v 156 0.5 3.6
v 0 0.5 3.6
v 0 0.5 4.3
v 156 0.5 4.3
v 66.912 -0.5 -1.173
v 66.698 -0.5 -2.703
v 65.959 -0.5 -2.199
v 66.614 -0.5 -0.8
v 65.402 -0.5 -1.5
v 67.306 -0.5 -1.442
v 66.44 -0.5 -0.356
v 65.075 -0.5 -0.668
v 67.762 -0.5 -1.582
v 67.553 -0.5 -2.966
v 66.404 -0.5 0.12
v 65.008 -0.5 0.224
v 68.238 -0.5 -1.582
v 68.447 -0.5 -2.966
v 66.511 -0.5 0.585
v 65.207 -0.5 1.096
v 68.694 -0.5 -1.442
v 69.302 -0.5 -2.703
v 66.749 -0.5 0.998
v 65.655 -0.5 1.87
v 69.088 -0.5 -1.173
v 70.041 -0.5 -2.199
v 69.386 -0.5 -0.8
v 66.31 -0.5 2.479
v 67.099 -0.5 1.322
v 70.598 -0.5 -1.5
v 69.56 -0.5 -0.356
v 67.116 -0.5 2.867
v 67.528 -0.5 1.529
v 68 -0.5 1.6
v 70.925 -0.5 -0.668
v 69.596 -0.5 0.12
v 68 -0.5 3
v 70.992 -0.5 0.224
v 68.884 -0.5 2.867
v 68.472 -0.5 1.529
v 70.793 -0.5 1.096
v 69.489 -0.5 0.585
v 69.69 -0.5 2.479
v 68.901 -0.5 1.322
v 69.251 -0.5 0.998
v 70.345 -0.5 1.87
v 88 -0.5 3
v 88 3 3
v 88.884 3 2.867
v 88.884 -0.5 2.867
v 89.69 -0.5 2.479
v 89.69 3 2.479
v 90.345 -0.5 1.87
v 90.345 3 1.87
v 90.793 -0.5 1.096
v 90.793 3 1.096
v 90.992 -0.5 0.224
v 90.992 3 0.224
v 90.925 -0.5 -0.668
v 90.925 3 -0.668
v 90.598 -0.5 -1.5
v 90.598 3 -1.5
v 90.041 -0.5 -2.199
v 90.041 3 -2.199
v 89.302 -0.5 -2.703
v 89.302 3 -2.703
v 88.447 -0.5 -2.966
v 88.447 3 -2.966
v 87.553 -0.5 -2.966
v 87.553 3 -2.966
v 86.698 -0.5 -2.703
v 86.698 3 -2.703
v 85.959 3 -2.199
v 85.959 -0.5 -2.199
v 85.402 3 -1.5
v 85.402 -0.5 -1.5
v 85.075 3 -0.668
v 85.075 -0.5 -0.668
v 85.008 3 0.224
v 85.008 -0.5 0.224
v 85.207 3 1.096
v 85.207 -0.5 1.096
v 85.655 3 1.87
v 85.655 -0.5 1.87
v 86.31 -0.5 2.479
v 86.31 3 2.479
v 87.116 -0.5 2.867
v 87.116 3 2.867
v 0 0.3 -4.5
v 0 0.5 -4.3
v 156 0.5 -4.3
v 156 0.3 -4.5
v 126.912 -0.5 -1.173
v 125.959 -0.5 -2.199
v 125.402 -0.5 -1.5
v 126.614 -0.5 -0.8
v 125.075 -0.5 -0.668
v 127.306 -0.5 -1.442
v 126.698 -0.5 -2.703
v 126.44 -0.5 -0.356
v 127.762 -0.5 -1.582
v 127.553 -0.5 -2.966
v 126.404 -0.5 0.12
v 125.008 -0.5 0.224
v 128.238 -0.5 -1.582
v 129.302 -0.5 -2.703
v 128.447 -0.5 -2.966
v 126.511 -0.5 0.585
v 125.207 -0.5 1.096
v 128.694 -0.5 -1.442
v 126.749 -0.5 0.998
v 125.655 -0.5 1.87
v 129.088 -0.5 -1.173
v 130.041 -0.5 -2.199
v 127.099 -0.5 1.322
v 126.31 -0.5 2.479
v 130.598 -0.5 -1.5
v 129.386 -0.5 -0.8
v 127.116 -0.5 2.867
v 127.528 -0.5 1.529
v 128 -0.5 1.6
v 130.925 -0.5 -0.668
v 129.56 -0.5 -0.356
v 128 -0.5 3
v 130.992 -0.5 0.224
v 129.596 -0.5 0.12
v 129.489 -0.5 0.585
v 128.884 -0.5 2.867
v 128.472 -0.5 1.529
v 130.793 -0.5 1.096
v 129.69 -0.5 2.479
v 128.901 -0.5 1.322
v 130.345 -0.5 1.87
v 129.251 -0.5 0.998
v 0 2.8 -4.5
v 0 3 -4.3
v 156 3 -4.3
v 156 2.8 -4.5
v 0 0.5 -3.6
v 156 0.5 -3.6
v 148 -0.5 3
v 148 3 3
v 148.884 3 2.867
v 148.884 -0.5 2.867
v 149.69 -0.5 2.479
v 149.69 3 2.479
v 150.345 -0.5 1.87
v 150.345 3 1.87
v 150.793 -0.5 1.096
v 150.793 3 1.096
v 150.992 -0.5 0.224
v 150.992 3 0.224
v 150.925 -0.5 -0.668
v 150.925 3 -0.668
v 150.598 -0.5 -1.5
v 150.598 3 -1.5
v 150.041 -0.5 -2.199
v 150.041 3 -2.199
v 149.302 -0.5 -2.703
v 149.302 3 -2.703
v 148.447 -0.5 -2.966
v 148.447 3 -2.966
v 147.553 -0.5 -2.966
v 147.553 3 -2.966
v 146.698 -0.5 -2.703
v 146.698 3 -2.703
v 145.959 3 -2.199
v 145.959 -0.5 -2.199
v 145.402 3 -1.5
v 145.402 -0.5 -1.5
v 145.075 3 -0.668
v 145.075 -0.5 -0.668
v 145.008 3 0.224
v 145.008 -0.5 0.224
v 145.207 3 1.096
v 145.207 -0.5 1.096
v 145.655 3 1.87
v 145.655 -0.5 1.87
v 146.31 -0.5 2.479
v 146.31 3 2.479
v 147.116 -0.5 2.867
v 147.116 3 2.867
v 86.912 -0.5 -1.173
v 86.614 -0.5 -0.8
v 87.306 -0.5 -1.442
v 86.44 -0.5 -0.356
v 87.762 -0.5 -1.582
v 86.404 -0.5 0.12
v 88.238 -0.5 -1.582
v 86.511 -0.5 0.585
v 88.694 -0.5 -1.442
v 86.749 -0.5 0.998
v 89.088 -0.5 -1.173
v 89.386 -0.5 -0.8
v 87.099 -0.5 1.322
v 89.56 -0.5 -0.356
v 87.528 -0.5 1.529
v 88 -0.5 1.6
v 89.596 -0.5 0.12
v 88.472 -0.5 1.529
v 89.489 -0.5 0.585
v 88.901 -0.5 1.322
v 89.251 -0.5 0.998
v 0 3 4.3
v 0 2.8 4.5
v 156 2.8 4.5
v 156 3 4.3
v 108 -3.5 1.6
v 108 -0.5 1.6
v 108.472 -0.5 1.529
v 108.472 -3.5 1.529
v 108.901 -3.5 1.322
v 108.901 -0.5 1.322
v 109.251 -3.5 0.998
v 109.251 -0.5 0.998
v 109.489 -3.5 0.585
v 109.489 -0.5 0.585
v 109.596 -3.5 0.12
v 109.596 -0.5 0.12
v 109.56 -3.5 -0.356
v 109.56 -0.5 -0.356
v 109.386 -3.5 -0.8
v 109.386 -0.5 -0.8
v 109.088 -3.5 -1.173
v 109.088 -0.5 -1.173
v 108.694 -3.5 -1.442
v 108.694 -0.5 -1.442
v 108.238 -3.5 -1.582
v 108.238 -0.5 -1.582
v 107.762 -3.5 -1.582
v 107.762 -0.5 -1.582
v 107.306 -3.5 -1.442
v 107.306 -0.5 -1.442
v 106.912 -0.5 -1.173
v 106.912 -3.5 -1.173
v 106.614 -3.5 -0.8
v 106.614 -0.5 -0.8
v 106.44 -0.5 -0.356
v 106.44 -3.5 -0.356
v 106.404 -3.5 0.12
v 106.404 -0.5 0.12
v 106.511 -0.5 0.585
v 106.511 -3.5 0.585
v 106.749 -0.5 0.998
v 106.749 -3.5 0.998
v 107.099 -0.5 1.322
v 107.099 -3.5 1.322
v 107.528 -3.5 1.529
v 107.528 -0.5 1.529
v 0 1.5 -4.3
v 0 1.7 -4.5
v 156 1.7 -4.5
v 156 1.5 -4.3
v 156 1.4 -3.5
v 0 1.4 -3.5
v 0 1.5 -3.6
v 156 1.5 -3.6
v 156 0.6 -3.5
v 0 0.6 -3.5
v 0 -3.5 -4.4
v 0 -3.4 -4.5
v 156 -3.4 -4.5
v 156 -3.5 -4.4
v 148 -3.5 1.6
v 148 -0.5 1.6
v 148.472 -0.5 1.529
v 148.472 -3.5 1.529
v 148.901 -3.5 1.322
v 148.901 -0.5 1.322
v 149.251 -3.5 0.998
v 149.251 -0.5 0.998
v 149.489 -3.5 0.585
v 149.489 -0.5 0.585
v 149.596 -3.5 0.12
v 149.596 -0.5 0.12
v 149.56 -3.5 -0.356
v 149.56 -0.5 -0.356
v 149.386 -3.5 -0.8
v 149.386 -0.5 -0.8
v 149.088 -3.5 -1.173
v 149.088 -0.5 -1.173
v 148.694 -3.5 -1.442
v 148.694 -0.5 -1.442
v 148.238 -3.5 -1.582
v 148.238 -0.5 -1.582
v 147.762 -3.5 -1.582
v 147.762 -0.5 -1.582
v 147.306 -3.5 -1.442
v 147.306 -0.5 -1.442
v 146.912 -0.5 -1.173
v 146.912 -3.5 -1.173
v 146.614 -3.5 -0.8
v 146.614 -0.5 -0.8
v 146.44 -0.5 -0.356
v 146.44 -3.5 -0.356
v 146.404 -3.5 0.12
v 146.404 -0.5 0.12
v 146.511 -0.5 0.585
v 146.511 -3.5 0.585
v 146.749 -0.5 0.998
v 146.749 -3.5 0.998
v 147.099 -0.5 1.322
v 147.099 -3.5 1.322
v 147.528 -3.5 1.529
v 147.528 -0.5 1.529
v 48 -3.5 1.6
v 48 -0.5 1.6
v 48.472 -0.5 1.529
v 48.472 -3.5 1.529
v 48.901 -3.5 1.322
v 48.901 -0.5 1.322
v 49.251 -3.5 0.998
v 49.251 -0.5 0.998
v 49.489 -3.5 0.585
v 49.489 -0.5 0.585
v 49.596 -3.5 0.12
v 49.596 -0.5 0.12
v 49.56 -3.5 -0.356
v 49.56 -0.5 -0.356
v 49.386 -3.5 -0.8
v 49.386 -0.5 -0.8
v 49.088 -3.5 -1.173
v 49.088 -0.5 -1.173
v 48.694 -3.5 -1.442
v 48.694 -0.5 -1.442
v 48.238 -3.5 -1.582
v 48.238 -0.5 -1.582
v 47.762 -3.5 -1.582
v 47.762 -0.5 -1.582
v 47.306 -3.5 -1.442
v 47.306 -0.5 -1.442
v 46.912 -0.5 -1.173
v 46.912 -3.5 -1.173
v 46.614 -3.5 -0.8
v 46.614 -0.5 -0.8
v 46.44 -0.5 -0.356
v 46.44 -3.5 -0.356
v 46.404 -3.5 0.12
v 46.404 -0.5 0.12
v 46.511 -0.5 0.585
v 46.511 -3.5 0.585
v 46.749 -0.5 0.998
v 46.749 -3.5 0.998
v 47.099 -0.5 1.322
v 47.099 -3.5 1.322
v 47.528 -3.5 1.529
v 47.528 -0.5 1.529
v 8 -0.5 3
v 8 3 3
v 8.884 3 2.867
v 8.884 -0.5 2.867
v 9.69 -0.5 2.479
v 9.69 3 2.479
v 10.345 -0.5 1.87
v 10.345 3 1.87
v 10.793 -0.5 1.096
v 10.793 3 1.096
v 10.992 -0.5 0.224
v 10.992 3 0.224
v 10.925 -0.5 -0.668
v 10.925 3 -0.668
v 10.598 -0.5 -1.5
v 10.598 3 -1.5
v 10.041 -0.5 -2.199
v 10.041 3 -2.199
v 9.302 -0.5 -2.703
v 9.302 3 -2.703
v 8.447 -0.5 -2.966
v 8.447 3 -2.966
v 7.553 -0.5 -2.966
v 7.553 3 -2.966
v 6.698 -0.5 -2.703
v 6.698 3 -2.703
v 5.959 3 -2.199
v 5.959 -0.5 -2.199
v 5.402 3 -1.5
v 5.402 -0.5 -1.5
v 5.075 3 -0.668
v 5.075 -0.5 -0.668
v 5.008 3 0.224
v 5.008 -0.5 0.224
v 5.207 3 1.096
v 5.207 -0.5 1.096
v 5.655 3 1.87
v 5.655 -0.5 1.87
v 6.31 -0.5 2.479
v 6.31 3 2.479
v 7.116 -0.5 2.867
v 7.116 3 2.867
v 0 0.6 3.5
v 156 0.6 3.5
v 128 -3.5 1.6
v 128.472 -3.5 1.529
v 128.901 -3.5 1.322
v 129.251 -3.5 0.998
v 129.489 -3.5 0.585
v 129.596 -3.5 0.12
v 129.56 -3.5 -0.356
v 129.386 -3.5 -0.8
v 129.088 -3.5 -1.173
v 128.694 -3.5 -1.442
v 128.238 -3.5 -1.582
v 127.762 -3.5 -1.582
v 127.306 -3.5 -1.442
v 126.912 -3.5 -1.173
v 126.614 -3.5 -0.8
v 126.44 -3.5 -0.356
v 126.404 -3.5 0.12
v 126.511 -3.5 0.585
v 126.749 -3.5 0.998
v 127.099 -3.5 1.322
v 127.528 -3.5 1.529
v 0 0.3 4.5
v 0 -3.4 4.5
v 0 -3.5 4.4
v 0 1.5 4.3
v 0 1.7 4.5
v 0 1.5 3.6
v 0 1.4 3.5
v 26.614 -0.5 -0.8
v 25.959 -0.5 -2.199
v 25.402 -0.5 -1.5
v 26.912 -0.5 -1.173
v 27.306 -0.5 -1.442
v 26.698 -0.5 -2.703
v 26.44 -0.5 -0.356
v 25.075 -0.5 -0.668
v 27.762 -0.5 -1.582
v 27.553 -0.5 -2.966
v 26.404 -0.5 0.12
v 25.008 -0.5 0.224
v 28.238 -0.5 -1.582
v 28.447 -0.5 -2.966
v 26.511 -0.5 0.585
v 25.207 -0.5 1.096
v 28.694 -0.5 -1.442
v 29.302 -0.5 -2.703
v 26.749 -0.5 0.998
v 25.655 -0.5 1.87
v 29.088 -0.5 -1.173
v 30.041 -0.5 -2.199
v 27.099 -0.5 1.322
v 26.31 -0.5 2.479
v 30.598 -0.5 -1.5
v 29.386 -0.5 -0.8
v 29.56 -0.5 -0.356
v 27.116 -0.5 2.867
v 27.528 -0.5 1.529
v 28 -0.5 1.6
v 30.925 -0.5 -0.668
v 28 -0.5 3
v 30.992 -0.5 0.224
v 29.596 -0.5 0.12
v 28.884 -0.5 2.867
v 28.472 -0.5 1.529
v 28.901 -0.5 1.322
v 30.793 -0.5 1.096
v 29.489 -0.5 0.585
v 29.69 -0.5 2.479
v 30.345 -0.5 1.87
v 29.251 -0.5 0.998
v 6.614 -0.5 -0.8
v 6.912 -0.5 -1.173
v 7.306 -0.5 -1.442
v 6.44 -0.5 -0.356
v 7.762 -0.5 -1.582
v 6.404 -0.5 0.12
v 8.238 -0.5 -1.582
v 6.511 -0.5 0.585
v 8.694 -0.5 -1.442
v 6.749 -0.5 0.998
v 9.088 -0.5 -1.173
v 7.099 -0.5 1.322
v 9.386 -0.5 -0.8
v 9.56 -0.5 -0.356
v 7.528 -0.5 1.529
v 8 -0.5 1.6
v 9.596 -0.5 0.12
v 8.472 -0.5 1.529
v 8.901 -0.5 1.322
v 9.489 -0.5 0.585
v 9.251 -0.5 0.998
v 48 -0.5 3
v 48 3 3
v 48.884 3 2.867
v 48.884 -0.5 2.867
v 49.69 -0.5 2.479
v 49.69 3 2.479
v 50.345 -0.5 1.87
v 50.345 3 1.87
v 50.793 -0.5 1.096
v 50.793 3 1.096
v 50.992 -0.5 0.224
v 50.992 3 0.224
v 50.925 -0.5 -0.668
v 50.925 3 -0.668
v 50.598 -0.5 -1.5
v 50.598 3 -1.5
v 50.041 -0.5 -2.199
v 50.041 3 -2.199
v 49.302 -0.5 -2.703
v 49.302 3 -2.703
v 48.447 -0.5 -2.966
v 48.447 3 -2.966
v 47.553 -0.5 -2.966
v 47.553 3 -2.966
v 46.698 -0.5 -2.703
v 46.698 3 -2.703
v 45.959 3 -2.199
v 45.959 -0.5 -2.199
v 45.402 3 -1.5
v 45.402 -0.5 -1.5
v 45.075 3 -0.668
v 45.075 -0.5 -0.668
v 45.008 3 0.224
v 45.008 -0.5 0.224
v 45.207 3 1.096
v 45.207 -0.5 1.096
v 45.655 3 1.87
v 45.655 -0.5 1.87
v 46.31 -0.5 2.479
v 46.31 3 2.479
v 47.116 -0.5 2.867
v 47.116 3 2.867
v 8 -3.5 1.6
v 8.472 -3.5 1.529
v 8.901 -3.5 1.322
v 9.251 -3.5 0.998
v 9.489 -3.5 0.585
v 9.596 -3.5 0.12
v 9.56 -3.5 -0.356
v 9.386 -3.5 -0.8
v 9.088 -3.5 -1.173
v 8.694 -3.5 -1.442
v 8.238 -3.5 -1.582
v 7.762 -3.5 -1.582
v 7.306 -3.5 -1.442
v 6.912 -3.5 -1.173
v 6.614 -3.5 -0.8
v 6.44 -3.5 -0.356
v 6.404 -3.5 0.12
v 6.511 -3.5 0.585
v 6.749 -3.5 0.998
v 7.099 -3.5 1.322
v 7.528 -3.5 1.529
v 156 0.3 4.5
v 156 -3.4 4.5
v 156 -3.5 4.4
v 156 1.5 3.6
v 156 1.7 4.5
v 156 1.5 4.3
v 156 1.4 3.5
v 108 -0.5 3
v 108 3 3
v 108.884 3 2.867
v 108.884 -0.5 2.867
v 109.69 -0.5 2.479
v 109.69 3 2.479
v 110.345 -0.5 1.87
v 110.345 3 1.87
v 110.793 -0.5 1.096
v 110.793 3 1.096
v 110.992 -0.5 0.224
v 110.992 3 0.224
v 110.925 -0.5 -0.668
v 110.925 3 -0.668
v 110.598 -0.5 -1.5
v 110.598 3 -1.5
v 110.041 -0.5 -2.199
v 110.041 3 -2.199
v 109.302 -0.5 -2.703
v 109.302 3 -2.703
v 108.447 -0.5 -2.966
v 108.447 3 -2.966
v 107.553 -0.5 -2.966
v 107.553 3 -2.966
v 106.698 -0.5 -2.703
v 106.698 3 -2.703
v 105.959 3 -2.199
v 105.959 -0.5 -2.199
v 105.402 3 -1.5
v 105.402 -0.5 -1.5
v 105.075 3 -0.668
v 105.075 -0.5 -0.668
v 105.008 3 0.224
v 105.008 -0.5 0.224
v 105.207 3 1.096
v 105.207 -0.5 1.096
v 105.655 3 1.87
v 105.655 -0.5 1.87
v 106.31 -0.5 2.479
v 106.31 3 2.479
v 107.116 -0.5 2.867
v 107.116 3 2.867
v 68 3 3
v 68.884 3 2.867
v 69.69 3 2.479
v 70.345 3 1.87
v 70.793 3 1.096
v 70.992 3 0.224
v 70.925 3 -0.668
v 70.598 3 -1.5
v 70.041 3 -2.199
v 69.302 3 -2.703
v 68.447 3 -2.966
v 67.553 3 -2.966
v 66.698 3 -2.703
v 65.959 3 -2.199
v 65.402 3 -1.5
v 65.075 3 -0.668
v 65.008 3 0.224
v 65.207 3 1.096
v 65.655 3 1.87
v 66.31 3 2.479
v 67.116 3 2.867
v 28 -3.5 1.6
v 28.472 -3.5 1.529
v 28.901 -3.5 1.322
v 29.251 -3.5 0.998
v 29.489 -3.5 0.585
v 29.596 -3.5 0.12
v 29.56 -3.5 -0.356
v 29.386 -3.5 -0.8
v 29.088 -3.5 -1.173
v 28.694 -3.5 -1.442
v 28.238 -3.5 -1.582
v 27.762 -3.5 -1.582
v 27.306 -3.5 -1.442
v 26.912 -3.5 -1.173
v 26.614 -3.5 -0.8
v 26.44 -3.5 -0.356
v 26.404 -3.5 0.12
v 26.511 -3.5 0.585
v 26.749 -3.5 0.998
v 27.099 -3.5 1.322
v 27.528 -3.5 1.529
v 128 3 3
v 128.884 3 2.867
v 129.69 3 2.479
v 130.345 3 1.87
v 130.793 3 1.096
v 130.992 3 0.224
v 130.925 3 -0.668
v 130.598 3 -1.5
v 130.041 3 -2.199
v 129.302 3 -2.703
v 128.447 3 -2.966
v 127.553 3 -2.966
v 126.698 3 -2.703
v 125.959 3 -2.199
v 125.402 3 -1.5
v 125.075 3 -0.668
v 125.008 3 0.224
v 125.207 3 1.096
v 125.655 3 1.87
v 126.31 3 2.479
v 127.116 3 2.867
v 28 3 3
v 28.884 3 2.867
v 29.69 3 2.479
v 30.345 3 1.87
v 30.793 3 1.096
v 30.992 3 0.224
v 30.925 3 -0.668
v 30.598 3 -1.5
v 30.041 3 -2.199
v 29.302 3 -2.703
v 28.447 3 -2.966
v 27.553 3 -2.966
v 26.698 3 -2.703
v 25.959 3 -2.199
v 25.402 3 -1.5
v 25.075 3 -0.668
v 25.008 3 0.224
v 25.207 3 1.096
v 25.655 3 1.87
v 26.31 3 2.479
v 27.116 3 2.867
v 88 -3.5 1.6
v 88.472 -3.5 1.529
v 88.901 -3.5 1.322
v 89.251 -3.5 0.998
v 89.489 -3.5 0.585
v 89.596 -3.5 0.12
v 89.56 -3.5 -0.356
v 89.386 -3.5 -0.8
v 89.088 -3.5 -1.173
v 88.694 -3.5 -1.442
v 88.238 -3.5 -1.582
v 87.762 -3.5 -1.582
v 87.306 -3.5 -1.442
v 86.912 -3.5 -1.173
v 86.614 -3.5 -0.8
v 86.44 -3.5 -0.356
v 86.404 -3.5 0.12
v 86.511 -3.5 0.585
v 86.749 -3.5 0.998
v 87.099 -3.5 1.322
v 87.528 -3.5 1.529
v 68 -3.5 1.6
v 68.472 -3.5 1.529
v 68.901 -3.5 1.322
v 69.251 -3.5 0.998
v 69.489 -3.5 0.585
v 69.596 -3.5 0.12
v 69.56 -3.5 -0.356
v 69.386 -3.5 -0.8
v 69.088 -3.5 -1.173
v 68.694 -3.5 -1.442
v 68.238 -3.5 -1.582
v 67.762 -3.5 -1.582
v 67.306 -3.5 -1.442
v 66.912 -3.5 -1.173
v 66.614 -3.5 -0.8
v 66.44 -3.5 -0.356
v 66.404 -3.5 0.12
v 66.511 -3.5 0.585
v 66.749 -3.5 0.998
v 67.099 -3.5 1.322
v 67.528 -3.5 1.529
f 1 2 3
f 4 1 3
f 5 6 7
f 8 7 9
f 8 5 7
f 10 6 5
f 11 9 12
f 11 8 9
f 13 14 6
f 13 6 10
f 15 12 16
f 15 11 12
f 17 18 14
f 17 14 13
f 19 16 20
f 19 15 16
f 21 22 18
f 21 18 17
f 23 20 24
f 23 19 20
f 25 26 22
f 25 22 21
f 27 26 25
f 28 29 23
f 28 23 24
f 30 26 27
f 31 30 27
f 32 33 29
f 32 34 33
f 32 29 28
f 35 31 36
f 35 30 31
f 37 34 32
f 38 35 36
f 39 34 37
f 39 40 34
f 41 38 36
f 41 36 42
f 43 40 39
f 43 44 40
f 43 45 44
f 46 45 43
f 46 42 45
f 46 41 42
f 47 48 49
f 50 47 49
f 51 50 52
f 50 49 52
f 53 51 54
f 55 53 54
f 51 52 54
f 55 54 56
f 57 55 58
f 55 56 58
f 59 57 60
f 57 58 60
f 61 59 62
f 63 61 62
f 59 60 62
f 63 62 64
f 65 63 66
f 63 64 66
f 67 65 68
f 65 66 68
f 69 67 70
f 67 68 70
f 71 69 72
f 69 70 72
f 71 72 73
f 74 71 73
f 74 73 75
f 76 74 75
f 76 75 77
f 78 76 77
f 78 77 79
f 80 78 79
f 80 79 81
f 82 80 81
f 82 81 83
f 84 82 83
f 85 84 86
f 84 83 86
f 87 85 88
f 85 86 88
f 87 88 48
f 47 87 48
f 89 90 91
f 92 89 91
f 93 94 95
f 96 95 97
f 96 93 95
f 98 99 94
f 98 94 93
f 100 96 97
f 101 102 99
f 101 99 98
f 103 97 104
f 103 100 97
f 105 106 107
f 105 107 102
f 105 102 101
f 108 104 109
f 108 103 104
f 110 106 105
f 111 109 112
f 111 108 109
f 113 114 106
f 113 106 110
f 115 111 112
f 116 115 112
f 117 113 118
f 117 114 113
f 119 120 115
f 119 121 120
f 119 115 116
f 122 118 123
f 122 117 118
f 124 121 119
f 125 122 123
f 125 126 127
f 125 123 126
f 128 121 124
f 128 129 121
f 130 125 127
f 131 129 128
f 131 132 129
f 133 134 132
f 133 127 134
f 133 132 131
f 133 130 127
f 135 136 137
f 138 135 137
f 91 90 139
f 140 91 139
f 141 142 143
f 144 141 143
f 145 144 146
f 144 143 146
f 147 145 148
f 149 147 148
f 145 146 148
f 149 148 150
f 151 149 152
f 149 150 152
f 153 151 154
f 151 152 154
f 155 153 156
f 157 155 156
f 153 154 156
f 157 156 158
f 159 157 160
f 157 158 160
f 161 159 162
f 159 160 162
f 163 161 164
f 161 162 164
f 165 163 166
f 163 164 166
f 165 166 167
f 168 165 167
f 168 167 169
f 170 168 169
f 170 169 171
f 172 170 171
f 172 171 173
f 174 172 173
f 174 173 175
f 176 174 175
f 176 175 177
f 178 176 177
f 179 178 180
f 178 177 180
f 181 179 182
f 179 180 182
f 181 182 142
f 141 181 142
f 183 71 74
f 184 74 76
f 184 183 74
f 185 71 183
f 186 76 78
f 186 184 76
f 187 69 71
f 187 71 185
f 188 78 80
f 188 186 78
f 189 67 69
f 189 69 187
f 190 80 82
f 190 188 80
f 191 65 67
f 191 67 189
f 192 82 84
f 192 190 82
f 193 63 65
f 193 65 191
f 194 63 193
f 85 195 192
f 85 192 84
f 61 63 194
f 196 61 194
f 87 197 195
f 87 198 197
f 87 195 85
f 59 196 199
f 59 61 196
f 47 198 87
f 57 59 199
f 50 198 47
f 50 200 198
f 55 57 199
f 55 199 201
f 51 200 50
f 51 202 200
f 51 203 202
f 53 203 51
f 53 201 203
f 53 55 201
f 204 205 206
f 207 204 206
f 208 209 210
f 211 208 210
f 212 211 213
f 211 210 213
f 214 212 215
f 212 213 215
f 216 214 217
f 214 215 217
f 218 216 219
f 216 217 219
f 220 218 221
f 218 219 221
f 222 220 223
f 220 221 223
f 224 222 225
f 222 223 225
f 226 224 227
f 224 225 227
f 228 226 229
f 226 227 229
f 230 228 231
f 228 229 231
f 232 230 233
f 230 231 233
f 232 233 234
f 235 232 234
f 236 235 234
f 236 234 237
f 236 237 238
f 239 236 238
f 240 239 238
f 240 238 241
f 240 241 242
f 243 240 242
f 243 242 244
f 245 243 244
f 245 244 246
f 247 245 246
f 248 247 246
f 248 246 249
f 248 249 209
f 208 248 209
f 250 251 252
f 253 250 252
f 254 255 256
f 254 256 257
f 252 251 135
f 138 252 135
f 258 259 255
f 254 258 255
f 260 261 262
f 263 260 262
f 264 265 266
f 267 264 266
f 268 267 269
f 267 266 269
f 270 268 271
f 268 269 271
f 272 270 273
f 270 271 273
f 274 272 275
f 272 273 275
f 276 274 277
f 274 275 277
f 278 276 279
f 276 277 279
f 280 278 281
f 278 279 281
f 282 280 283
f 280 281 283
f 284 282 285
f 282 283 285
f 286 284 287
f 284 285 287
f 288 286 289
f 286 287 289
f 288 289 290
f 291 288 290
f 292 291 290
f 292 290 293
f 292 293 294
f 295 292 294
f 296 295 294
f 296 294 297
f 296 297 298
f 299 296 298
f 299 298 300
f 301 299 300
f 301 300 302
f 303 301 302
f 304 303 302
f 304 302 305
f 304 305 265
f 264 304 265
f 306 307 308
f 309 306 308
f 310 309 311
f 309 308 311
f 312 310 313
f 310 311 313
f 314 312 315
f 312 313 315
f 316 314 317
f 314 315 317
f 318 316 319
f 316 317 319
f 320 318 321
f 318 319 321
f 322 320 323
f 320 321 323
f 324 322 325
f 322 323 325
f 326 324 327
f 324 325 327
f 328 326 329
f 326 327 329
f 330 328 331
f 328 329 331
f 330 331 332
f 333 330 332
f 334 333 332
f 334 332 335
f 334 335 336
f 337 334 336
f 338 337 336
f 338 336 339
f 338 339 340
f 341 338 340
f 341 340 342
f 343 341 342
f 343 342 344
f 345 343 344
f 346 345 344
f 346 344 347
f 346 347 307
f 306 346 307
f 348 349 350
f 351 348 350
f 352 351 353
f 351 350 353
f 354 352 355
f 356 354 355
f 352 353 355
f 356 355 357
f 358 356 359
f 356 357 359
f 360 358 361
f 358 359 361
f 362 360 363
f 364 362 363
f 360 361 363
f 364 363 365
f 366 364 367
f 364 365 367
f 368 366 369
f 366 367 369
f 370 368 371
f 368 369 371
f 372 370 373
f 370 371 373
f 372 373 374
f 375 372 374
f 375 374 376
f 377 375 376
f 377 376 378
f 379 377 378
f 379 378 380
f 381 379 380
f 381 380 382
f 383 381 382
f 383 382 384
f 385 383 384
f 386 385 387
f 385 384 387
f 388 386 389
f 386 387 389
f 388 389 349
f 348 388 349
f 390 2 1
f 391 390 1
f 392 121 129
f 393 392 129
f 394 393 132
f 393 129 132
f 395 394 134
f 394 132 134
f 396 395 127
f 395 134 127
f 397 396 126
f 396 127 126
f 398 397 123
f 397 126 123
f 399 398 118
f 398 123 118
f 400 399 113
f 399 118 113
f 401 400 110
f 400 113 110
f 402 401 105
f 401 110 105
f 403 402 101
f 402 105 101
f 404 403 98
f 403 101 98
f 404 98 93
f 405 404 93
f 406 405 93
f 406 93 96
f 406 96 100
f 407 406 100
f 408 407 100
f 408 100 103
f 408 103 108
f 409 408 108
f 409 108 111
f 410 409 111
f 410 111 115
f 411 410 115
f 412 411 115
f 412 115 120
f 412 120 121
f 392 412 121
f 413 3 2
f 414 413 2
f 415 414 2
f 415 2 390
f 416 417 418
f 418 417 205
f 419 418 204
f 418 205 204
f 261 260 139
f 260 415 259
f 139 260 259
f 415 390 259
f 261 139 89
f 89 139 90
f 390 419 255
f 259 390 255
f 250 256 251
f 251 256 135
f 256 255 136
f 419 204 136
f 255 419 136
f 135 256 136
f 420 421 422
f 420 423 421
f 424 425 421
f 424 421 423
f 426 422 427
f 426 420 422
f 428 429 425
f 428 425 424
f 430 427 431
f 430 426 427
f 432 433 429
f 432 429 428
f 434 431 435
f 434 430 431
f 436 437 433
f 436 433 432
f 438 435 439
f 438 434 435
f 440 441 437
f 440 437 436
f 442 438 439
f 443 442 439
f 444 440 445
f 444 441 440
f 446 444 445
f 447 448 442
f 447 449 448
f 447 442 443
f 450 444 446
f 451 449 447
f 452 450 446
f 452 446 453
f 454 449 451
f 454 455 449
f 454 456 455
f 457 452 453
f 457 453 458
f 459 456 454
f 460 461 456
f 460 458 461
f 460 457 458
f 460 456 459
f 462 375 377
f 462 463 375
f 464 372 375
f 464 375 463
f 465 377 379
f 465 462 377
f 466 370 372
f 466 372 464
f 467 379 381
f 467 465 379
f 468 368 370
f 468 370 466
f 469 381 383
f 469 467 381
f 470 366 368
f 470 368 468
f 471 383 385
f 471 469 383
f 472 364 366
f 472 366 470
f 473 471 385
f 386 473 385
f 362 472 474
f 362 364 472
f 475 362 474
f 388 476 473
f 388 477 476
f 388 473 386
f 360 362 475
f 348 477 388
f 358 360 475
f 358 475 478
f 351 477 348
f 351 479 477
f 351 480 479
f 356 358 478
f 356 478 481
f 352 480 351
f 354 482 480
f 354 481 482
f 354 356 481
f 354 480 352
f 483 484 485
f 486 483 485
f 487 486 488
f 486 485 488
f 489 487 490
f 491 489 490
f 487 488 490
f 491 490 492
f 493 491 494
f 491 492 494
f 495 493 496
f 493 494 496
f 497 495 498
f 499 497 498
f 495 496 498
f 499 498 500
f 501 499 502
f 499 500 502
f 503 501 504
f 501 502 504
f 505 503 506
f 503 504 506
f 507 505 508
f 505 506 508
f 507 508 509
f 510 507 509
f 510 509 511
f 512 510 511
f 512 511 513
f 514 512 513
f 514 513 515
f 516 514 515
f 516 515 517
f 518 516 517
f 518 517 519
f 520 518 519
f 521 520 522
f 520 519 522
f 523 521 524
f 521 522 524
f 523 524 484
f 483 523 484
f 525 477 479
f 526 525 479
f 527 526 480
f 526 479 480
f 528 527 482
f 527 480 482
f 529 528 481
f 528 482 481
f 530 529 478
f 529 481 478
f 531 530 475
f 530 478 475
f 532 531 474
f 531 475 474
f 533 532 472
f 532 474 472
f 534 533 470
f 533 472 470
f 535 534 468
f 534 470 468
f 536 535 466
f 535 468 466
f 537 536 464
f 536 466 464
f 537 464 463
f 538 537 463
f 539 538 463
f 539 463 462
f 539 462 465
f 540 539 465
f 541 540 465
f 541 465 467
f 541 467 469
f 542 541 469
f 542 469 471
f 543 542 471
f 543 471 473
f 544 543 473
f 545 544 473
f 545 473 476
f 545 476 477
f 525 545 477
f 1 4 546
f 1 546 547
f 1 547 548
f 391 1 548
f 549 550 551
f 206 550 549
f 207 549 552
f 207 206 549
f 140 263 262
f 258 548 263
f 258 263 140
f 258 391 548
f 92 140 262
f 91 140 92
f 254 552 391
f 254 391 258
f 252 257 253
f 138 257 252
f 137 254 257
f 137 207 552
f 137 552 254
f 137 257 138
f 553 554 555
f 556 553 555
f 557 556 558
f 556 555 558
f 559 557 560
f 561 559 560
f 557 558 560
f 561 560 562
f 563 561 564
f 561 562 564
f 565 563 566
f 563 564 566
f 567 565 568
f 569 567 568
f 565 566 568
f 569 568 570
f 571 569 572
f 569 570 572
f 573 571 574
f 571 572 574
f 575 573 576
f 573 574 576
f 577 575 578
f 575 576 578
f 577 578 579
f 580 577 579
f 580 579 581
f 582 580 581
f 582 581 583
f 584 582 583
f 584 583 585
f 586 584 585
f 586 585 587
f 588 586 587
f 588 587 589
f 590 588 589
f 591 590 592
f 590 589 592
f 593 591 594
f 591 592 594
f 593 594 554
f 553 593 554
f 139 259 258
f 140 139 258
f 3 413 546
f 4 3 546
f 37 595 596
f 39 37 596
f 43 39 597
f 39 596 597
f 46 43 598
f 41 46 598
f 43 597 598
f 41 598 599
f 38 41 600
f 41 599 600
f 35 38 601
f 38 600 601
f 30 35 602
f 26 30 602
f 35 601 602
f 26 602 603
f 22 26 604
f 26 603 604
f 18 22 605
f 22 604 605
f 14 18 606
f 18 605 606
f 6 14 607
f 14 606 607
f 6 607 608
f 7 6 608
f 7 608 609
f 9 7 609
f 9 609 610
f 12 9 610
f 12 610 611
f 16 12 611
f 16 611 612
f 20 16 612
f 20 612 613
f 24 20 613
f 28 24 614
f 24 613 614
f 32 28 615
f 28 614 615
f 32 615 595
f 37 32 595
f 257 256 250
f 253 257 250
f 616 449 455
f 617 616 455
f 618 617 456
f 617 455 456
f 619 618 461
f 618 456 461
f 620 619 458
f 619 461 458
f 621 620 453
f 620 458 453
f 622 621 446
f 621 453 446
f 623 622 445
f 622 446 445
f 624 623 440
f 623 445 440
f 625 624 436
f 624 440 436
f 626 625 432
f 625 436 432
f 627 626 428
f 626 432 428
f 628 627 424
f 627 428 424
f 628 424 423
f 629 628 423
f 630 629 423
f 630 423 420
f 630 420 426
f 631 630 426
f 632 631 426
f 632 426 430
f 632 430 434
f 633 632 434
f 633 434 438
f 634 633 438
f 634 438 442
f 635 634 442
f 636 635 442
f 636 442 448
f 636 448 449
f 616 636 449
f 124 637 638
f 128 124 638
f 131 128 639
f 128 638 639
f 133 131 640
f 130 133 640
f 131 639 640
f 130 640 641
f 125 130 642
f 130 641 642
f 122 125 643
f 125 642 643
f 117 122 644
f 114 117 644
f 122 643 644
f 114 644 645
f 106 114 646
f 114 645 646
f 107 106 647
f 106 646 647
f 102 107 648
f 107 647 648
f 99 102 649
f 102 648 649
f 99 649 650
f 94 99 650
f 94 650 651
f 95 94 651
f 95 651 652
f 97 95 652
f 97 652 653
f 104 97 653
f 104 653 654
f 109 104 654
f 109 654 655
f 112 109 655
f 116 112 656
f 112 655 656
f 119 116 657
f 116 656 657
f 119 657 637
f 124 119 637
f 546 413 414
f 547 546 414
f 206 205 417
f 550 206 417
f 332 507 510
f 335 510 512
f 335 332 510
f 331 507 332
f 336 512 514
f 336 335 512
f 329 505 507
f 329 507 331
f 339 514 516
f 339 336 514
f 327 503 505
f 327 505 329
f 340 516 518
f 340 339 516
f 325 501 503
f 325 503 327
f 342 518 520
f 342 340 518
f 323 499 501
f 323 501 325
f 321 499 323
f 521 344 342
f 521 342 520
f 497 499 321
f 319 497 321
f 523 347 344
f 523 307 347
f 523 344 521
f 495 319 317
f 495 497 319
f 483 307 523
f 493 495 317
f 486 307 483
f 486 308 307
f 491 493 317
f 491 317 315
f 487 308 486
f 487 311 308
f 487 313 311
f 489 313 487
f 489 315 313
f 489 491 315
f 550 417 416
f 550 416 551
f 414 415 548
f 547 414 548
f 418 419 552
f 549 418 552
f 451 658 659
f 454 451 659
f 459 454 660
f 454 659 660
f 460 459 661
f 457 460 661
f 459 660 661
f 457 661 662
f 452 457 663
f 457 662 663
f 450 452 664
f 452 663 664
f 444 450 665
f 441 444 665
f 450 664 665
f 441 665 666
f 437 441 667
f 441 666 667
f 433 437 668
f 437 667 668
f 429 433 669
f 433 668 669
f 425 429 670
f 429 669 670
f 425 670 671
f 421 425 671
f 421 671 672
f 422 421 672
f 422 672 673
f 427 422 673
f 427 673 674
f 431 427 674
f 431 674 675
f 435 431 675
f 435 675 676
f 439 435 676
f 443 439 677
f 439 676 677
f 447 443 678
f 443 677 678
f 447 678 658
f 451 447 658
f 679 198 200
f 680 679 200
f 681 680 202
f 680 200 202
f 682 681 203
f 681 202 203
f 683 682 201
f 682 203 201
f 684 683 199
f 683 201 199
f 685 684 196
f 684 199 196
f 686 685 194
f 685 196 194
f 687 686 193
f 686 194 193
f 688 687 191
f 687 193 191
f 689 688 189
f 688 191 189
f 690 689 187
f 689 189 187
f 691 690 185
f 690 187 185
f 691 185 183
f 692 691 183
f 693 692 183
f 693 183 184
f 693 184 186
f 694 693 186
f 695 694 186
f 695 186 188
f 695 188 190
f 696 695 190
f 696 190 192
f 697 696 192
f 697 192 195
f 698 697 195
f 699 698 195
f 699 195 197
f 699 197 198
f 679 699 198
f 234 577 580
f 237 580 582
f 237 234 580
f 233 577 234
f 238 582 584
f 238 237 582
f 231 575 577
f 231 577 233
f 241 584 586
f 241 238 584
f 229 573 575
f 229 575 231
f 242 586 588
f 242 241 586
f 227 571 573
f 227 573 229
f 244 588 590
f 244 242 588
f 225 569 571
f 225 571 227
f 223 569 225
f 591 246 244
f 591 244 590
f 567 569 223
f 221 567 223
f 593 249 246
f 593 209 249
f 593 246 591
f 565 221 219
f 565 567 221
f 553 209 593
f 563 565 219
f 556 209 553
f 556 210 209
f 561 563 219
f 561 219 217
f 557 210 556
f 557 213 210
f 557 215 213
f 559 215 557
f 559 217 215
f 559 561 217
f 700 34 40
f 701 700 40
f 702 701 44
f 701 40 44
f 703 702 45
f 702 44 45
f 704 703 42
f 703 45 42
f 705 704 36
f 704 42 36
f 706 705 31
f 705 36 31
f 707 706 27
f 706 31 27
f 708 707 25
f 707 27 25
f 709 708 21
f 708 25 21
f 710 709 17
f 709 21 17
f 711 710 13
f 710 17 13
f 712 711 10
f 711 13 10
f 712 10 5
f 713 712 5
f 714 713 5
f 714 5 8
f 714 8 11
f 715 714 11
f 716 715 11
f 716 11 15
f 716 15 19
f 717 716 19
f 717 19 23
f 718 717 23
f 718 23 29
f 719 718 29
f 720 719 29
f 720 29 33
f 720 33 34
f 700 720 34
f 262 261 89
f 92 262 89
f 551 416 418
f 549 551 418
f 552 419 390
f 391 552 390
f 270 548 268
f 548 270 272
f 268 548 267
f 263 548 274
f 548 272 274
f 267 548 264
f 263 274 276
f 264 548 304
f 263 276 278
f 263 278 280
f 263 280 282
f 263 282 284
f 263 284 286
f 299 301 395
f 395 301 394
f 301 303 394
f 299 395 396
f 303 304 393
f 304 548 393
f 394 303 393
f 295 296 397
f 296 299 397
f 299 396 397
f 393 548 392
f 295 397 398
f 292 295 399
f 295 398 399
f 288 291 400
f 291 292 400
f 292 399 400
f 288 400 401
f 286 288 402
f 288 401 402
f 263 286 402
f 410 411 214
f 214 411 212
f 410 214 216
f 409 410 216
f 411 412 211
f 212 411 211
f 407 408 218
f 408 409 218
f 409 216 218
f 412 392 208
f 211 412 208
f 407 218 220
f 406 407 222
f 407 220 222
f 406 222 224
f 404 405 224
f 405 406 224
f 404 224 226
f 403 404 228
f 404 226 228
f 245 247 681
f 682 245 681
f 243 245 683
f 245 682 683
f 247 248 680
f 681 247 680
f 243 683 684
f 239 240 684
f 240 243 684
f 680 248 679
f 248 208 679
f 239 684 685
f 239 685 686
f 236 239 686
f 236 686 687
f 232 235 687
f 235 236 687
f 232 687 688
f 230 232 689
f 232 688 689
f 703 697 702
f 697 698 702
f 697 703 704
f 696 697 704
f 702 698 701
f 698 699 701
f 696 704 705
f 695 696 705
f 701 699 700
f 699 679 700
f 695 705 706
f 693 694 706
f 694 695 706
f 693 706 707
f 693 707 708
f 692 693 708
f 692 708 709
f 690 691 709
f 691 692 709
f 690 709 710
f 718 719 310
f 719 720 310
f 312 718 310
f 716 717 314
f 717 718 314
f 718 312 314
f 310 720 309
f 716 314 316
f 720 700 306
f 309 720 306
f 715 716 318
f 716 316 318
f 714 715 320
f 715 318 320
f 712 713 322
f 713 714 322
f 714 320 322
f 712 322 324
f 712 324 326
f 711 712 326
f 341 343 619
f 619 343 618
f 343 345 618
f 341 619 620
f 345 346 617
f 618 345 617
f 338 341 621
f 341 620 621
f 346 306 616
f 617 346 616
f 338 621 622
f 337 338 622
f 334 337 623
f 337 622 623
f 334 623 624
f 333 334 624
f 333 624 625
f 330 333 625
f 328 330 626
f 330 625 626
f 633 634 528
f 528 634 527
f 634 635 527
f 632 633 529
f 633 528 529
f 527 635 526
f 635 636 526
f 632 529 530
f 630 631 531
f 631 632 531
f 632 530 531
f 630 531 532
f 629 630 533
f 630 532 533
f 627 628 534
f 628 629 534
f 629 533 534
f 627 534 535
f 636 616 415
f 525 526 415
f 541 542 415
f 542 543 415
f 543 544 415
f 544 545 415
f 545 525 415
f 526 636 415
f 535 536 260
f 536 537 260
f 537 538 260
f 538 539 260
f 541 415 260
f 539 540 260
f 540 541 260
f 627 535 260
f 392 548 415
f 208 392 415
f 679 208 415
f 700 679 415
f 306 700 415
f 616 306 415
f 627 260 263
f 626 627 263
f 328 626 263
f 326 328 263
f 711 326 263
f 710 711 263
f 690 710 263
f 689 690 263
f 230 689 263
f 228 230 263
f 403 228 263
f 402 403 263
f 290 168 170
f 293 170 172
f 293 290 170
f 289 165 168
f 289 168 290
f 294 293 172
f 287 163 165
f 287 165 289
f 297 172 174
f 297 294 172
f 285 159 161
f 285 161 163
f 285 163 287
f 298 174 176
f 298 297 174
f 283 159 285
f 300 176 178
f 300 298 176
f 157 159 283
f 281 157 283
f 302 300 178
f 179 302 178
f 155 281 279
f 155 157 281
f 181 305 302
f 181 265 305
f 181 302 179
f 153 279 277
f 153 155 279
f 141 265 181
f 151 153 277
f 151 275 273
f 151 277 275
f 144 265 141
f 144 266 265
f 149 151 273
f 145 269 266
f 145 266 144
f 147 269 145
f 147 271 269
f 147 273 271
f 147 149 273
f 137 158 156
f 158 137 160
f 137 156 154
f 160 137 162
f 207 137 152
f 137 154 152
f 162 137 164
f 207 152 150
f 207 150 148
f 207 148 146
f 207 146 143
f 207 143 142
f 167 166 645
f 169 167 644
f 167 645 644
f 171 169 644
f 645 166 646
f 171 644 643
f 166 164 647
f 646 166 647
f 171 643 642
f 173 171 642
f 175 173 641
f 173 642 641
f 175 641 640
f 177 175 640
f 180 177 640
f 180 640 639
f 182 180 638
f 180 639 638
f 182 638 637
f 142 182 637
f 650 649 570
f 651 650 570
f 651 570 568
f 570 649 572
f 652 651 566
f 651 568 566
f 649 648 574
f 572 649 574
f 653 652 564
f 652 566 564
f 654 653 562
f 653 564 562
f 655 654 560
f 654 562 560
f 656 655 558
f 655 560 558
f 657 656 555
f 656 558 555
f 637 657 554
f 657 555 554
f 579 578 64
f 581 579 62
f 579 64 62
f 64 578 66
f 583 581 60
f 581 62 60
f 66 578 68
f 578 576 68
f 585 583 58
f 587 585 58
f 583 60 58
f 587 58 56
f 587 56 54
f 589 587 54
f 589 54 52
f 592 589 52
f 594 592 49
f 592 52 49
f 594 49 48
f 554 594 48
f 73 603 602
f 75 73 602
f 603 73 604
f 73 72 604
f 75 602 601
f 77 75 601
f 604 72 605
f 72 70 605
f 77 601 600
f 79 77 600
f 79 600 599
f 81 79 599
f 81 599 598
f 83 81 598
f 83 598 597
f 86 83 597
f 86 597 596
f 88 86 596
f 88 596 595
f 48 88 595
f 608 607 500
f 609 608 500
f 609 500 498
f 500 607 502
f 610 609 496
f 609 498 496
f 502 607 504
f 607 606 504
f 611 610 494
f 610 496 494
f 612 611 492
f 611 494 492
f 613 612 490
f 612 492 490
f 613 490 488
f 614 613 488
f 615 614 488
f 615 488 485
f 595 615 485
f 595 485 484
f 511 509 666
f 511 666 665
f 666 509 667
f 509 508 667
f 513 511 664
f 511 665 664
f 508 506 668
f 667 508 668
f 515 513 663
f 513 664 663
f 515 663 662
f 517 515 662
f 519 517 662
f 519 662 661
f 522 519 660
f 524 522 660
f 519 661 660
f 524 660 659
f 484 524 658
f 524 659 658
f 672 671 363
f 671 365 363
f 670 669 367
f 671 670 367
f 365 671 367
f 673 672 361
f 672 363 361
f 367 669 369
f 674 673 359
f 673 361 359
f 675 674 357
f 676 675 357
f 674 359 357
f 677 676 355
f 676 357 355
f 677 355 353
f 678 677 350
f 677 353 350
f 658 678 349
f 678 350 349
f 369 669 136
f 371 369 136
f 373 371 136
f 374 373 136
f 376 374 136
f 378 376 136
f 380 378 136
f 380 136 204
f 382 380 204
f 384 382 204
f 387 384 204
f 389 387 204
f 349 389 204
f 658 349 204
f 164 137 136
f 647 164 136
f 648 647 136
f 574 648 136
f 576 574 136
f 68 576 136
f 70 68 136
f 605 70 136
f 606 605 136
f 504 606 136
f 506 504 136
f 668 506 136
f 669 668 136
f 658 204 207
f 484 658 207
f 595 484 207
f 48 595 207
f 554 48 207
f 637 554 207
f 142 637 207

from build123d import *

# Parameters (mm, degrees)
EXTRUDE_1_DEPTH     = 156
CHAMFER_1_SIZE      = 0.2
CHAMFER_2_SIZE      = 0.1
SKETCH_2_R          = 1.6
CUT_EXTRUDE_1_DEPTH = 6.5
SKETCH_3_R          = 3
CUT_EXTRUDE_2_DEPTH = 3.5


with BuildPart() as part:
    # 草图1 → 凸台-拉伸1 (new body)
    with BuildSketch(Plane(origin=(0, 0, 0), x_dir=(0, 0, -1), z_dir=(1, 0, 0))):
        Polygon((-4.5, 1.5), (-3.5, 1.5), (-3.5, 0.5), (-4.5, 0.5), (-4.5, -3.5), (4.5, -3.5), (4.5, 0.5), (3.5, 0.5), (3.5, 1.5), (4.5, 1.5), (4.5, 3), (-4.5, 3), align=None)
    extrude(amount=EXTRUDE_1_DEPTH)

    # 倒角1
    chamfer_1_edges = [part.edges().sort_by_distance(p)[0] for p in [
        (78, 1.5, -4.5),
        (78, 0.5, -4.5),
        (78, 0.5, 4.5),
        (78, 1.5, 4.5),
        (78, 3, 4.5),
        (78, 3, -4.5),
    ]]
    chamfer(chamfer_1_edges, length=CHAMFER_1_SIZE)

    # 倒角2
    chamfer_2_edges = [part.edges().sort_by_distance(p)[0] for p in [
        (78, 1.5, -3.5),
        (78, 0.5, -3.5),
        (78, -3.5, -4.5),
        (78, -3.5, 4.5),
        (78, 0.5, 3.5),
        (78, 1.5, 3.5),
    ]]
    chamfer(chamfer_2_edges, length=CHAMFER_2_SIZE)

    # 草图2 → 切除-拉伸1 (cut)
    with BuildSketch(Plane(origin=(0, 3, 0), x_dir=(1, 0, 0), z_dir=(0, 1, 0))):
        with Locations(Location((8, 0, 0), (0, 0, 270))):
            Circle(SKETCH_2_R)
        with Locations(Location((28, 0, 0), (0, 0, 270))):
            Circle(SKETCH_2_R)
        with Locations(Location((48, 0, 0), (0, 0, 270))):
            Circle(SKETCH_2_R)
        with Locations(Location((68, 0, 0), (0, 0, 270))):
            Circle(SKETCH_2_R)
        with Locations(Location((88, 0, 0), (0, 0, 270))):
            Circle(SKETCH_2_R)
        with Locations(Location((108, 0, 0), (0, 0, 270))):
            Circle(SKETCH_2_R)
        with Locations(Location((128, 0, 0), (0, 0, 270))):
            Circle(SKETCH_2_R)
        with Locations(Location((148, 0, 0), (0, 0, 270))):
            Circle(SKETCH_2_R)
    extrude(amount=-CUT_EXTRUDE_1_DEPTH, mode=Mode.SUBTRACT)

    # 草图3 → 切除-拉伸2 (cut)
    with BuildSketch(Plane(origin=(0, 3, 0), x_dir=(1, 0, 0), z_dir=(0, 1, 0))):
        with Locations(Location((8, 0, 0), (0, 0, 270))):
            Circle(SKETCH_3_R)
        with Locations(Location((28, 0, 0), (0, 0, 270))):
            Circle(SKETCH_3_R)
        with Locations(Location((48, 0, 0), (0, 0, 270))):
            Circle(SKETCH_3_R)
        with Locations(Location((68, 0, 0), (0, 0, 270))):
            Circle(SKETCH_3_R)
        with Locations(Location((88, 0, 0), (0, 0, 270))):
            Circle(SKETCH_3_R)
        with Locations(Location((108, 0, 0), (0, 0, 270))):
            Circle(SKETCH_3_R)
        with Locations(Location((128, 0, 0), (0, 0, 270))):
            Circle(SKETCH_3_R)
        with Locations(Location((148, 0, 0), (0, 0, 270))):
            Circle(SKETCH_3_R)
    extrude(amount=-CUT_EXTRUDE_2_DEPTH, mode=Mode.SUBTRACT)


solid = part.part
